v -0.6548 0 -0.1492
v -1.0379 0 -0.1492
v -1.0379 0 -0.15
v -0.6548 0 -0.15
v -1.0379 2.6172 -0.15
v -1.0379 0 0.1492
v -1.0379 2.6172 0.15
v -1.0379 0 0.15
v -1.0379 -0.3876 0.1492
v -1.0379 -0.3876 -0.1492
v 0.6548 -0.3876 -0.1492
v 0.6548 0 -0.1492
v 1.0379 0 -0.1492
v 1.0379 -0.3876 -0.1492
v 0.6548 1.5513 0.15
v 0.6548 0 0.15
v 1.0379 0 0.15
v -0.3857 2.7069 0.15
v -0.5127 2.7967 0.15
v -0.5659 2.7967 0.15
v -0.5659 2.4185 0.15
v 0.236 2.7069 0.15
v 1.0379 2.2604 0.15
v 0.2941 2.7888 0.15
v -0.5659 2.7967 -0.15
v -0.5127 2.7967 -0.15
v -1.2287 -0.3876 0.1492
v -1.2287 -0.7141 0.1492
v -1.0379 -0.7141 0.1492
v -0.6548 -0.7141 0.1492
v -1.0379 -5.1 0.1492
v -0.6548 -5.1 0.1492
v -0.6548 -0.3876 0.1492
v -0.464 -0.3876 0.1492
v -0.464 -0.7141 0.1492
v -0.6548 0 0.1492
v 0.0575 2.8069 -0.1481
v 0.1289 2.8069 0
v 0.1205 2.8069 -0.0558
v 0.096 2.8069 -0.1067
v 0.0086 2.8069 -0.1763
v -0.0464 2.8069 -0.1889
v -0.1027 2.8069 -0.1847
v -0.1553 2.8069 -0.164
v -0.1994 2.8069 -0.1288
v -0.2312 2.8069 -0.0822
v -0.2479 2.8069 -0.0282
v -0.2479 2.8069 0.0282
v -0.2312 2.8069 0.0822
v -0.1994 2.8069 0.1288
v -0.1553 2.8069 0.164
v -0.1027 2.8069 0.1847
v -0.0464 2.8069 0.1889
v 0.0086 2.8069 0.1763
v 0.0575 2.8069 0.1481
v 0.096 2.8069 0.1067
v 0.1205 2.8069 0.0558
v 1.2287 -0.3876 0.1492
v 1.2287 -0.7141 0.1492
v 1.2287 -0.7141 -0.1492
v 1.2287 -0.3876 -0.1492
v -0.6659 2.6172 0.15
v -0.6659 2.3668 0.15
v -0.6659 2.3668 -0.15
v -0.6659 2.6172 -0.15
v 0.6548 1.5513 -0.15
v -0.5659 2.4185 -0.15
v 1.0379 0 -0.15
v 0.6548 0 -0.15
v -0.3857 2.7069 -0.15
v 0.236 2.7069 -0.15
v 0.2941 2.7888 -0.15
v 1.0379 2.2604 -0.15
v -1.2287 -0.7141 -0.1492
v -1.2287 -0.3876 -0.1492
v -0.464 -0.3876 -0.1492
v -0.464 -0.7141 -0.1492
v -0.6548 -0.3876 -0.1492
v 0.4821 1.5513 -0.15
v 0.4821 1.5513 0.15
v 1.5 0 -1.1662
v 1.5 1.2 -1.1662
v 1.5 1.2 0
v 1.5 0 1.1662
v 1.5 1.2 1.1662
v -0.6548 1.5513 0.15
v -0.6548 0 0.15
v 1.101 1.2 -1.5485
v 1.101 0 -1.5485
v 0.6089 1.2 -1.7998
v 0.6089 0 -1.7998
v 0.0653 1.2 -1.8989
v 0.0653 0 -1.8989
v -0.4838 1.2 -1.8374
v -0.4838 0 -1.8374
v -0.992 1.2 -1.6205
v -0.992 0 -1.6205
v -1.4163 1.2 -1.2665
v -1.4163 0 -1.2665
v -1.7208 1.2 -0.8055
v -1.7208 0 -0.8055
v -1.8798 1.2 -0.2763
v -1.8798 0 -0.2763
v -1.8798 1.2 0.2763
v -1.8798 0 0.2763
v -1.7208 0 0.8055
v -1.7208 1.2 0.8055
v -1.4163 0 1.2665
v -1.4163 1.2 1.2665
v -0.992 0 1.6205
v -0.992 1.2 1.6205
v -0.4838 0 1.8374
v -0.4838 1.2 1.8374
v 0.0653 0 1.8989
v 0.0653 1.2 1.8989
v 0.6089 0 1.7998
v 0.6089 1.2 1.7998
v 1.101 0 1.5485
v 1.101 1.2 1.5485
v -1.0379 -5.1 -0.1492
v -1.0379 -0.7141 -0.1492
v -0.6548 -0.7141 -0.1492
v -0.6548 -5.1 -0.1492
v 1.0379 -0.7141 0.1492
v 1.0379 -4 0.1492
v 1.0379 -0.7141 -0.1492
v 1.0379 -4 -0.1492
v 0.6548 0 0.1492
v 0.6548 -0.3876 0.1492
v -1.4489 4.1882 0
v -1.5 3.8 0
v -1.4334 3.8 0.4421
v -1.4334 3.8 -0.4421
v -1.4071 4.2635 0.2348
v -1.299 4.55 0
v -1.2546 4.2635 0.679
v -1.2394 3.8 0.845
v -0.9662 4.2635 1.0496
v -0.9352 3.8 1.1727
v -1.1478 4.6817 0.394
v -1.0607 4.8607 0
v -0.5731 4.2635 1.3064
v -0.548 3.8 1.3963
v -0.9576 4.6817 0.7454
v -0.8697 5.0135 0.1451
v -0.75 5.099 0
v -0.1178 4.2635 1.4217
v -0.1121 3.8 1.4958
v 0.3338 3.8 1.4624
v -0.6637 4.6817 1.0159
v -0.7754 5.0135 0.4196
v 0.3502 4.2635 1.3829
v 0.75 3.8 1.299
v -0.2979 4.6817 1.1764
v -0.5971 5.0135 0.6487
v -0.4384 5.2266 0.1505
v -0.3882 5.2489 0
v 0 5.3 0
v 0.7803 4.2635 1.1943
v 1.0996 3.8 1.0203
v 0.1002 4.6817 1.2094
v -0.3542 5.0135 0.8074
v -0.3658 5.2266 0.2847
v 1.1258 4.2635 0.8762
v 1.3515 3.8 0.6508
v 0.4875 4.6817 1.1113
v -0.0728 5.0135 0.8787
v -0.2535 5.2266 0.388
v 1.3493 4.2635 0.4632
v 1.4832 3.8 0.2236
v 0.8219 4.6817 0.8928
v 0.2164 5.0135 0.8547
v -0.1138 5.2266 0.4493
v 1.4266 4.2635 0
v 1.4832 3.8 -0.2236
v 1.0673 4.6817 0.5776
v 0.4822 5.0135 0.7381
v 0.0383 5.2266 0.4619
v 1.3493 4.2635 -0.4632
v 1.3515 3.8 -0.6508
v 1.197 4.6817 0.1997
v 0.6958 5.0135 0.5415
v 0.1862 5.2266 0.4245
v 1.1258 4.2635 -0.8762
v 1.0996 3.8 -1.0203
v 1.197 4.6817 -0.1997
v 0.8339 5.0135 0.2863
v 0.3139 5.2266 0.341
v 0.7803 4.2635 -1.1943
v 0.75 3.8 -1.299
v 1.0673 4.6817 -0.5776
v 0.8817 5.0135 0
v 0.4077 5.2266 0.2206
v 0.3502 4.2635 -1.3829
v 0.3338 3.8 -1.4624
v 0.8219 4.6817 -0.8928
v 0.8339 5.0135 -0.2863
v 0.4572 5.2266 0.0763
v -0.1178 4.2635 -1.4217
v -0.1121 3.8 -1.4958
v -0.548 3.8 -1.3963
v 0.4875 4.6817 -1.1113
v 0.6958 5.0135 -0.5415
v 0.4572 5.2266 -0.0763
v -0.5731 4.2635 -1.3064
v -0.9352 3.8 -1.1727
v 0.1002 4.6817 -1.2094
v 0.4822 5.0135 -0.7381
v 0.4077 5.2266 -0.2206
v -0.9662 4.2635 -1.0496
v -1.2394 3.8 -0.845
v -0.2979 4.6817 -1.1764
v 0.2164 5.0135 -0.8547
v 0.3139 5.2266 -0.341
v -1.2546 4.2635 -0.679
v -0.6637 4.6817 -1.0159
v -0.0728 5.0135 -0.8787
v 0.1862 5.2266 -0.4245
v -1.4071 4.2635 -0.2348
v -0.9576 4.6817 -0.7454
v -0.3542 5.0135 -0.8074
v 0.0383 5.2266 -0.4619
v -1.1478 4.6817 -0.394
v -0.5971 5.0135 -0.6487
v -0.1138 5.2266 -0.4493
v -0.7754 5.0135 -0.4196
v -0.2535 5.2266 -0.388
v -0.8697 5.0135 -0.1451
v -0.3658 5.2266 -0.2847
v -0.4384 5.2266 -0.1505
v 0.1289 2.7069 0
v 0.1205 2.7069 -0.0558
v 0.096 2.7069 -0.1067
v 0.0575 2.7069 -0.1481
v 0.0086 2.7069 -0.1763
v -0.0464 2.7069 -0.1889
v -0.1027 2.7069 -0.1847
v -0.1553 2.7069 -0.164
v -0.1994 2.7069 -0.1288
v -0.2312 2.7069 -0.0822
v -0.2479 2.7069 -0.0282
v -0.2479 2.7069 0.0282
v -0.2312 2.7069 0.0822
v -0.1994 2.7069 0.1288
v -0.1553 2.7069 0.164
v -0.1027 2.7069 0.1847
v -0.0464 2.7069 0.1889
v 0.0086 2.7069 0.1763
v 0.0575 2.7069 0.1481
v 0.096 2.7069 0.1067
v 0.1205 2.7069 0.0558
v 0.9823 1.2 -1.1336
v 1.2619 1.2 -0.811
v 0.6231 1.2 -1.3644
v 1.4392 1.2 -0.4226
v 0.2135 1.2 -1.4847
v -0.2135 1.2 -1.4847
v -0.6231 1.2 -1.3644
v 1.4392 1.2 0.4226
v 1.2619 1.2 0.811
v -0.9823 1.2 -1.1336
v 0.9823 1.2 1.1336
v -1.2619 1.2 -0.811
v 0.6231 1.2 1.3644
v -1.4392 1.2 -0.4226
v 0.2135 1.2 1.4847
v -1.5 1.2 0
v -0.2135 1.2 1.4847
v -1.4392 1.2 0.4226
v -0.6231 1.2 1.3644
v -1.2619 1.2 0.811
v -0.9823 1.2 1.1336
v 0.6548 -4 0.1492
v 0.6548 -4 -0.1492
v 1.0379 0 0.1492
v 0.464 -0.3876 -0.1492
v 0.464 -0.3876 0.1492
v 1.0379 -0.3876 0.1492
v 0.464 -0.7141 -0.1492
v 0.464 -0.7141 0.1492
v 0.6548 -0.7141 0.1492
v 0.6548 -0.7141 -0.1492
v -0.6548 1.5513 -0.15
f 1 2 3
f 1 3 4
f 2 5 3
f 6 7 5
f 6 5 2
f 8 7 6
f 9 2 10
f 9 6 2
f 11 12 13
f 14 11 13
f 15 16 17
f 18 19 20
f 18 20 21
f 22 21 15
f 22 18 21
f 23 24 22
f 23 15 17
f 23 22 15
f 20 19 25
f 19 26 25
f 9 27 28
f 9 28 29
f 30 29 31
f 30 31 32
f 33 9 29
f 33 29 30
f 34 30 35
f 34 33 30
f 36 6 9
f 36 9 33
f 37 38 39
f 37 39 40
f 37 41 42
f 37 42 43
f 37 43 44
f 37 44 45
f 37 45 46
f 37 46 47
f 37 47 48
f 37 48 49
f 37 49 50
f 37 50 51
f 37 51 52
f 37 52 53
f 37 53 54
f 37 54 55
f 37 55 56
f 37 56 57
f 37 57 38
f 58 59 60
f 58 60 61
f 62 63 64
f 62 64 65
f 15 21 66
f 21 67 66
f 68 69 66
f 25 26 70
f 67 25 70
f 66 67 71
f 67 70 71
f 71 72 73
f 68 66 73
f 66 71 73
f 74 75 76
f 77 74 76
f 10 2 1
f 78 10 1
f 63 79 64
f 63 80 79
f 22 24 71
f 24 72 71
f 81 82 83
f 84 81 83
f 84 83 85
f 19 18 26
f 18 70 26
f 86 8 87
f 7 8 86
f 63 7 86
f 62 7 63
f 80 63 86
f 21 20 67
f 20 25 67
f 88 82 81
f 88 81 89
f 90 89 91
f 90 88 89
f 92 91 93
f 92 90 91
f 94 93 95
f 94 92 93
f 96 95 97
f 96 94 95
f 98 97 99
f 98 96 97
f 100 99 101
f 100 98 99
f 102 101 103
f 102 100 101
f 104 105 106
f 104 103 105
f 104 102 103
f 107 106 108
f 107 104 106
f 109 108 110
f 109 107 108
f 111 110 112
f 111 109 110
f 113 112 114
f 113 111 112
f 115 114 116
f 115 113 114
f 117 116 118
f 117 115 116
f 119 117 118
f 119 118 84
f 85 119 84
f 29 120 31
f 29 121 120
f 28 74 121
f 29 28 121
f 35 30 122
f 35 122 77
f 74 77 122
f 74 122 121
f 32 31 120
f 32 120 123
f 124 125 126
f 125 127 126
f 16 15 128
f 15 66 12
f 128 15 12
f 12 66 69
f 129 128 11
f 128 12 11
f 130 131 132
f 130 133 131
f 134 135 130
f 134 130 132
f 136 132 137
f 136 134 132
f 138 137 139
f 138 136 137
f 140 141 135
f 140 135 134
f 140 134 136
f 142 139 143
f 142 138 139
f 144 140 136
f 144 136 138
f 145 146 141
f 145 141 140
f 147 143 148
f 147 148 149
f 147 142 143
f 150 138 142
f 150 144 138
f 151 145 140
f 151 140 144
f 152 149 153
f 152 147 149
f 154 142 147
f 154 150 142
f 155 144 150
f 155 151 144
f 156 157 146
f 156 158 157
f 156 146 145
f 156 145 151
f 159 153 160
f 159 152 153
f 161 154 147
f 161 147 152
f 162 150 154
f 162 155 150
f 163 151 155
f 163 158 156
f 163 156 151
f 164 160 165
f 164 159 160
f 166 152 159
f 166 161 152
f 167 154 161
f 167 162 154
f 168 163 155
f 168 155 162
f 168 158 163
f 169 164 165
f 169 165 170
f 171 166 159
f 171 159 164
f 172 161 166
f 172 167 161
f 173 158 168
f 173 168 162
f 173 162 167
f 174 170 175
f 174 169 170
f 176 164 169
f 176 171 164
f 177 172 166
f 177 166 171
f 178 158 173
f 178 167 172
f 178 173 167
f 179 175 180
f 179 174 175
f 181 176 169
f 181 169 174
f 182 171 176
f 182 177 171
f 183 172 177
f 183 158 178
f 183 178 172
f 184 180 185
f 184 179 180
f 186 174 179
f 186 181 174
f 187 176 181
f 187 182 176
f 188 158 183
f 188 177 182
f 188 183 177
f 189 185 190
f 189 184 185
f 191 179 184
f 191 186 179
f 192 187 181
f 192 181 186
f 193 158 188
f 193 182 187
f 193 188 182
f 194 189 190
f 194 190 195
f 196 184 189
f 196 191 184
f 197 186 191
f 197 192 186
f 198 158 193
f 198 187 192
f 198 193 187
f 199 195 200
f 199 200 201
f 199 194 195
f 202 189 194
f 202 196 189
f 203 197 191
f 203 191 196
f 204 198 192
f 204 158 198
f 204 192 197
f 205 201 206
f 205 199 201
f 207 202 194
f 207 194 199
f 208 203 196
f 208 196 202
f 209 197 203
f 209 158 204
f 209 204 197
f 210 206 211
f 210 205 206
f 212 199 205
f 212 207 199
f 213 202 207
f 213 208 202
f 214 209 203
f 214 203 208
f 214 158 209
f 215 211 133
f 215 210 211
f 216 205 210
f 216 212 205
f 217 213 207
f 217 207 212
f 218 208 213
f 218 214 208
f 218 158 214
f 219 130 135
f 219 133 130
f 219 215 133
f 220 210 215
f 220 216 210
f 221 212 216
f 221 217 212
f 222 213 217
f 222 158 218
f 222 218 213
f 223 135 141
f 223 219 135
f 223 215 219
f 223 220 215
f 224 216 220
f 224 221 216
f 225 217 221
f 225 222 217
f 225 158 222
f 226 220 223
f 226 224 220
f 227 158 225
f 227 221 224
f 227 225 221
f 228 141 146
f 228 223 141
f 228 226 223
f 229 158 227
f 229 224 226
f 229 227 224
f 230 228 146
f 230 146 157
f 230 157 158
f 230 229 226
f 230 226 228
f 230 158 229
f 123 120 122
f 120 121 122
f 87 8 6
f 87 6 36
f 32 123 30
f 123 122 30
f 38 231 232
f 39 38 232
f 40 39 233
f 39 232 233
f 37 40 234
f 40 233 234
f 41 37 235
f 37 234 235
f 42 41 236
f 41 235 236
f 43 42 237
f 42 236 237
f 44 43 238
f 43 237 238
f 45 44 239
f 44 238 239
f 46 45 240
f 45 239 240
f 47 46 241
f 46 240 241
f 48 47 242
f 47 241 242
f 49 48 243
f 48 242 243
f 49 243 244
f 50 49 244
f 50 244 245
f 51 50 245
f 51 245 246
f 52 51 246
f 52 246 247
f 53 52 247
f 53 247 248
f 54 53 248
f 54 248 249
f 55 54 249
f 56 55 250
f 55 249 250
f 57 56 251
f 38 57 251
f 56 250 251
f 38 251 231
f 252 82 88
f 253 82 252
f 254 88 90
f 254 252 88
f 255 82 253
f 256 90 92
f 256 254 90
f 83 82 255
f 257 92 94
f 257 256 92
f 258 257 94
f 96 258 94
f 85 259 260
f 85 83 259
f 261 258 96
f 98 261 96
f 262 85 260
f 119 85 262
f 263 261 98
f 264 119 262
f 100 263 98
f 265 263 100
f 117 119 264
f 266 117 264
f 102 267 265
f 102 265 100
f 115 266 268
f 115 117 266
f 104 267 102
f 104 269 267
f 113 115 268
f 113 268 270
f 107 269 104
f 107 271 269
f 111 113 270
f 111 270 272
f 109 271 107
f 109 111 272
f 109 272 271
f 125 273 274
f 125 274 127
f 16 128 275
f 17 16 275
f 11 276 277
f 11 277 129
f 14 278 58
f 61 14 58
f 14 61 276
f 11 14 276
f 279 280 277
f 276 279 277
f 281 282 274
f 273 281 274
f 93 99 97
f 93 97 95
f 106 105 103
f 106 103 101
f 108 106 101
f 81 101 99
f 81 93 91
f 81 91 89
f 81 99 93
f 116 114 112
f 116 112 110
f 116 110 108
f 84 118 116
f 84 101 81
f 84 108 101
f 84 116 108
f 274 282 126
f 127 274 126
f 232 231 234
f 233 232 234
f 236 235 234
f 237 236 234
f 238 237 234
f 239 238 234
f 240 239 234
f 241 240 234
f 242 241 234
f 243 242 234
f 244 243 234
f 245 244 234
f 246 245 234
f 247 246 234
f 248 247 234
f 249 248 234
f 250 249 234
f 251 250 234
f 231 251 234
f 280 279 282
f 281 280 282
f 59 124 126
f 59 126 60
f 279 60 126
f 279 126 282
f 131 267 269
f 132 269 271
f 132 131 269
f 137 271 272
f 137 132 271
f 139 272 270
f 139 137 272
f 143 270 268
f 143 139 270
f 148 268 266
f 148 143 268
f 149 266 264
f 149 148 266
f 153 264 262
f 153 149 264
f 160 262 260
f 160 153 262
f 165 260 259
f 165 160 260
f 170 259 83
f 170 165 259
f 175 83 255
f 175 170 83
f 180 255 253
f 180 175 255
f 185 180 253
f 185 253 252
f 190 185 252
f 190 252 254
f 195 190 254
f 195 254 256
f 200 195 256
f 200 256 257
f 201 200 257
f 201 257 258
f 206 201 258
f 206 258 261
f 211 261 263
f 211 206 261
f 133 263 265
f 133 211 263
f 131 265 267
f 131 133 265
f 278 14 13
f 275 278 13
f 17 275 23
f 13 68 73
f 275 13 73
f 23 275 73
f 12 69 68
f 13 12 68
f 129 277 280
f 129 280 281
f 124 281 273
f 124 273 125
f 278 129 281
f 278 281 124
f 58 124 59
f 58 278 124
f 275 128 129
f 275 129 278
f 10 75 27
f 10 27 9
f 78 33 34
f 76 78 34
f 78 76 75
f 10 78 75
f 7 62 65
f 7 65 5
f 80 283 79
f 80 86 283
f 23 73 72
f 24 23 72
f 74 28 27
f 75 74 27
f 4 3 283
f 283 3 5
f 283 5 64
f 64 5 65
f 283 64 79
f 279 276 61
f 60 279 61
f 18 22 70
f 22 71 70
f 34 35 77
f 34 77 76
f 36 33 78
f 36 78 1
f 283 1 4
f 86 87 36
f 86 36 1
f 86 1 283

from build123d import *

# Parameters (mm, degrees)
CUT_EXTRUDE1_DEPTH    = 10
SKETCH3_W             = 0.383062026
SKETCH3_H             = 0.298484562
BOSS_EXTRUDE1_DEPTH   = 4
BOSS_EXTRUDE1_2_DEPTH = 4
BOSS_EXTRUDE2_DEPTH   = 0.15
SKETCH5_R             = 0.189425794
BOSS_EXTRUDE3_DEPTH   = 0.1
SKETCH6_W             = 0.76464177
SKETCH6_H             = 0.32650208
BOSS_EXTRUDE4_DEPTH   = 0.298485
SKETCH7_W             = 0.383062026
SKETCH7_H             = 0.298484562
BOSS_EXTRUDE5_DEPTH   = 1.1


with BuildPart() as part:
    # Sketch1 → Revolve1 (revolve)
    with BuildSketch(Plane.XY):
        with BuildLine():
            Line((0, 0), (-1.9, 0))
            Line((-1.9, 0), (-1.9, 1.2))
            Line((-1.9, 1.2), (-1.5, 1.2))
            Line((-1.5, 1.2), (-1.5, 3.8))
            ThreePointArc((-1.5, 3.8), (-1.060660172, 4.860660172), (0, 5.3))
            Line((0, 5.3), (0, 0))
        make_face()
    revolve(axis=Axis((0, 0, 0), (0, 1, 0)))

    # Sketch2 → Cut-Extrude1 (cut)
    with BuildSketch(Plane(origin=(0, 1.2, 0), x_dir=(1, 0, 0), z_dir=(0, 1, 0))):
        Polygon((1.5, 0), (1.5, 1.304892702), (2.01361065, 1.304892702), (2.01361065, -1.92540112), (1.5, -1.92540112), align=None)
    extrude(amount=-CUT_EXTRUDE1_DEPTH, mode=Mode.SUBTRACT)


with BuildPart() as body_2:
    # Sketch3 → Boss-Extrude1 (new body)
    with BuildSketch(Plane.XZ):
        with Locations((-0.846347528, 0)):
            Rectangle(SKETCH3_W, SKETCH3_H)
    extrude(amount=BOSS_EXTRUDE1_DEPTH)


with BuildPart() as body_3:
    # Sketch3 → Boss-Extrude1 2 (new body)
    with BuildSketch(Plane.XZ):
        with Locations((0.846347528, 0)):
            Rectangle(SKETCH3_W, SKETCH3_H)
    extrude(amount=BOSS_EXTRUDE1_2_DEPTH)


    add(body_2.part)  # Boss-Extrude2 merges body 2
    # Sketch4 → Boss-Extrude2 (add, symmetric)
    with BuildSketch(Plane.XY):
        Polygon((1.037878541, 2.260445566), (0.294117621, 2.788795467), (0.235969658, 2.706940276), (-0.385685641, 2.706940276), (-0.512741887, 2.796720697), (-0.565939225, 2.796720697), (-0.565939225, 2.617159855), (-0.565939225, 2.418450997), (0.654816515, 1.551255429), (0.654816515, 0), (1.037878541, 0), (1.037878541, 1.551255429), align=None)
        Polygon((0.482142428, 1.551255429), (-0.665939225, 2.366825071), (-0.665939225, 2.617159855), (-1.037878541, 2.617159855), (-1.037878541, 1.551255429), (-1.037878541, 0), (-0.654816515, 0), (-0.654816515, 1.551255429), align=None)
    extrude(amount=BOSS_EXTRUDE2_DEPTH, both=True)

    # Sketch6 → Boss-Extrude4 (add)
    with BuildSketch(Plane.XY.offset(0.149242281)):
        with Locations((0.846347528, -0.550865225)):
            Rectangle(SKETCH6_W, SKETCH6_H)
        with Locations((-0.846347528, -0.550865225)):
            Rectangle(SKETCH6_W, SKETCH6_H)
    extrude(amount=-BOSS_EXTRUDE4_DEPTH)

    # Sketch7 → Boss-Extrude5 (add)
    with BuildSketch(Plane.XZ.offset(4)):
        with Locations((-0.846347528, 0)):
            Rectangle(SKETCH7_W, SKETCH7_H)
    extrude(amount=BOSS_EXTRUDE5_DEPTH)


with BuildPart() as body_3_2:
    # Sketch5 → Boss-Extrude3 (new body)
    with BuildSketch(Plane(origin=(0, 2.706940276, 0), x_dir=(1, 0, 0), z_dir=(0, 1, 0))):
        with Locations((-0.060559566, 0)):
            Circle(SKETCH5_R)
    extrude(amount=BOSS_EXTRUDE3_DEPTH)


solid = Compound([part.part, body_3.part, body_3_2.part])
